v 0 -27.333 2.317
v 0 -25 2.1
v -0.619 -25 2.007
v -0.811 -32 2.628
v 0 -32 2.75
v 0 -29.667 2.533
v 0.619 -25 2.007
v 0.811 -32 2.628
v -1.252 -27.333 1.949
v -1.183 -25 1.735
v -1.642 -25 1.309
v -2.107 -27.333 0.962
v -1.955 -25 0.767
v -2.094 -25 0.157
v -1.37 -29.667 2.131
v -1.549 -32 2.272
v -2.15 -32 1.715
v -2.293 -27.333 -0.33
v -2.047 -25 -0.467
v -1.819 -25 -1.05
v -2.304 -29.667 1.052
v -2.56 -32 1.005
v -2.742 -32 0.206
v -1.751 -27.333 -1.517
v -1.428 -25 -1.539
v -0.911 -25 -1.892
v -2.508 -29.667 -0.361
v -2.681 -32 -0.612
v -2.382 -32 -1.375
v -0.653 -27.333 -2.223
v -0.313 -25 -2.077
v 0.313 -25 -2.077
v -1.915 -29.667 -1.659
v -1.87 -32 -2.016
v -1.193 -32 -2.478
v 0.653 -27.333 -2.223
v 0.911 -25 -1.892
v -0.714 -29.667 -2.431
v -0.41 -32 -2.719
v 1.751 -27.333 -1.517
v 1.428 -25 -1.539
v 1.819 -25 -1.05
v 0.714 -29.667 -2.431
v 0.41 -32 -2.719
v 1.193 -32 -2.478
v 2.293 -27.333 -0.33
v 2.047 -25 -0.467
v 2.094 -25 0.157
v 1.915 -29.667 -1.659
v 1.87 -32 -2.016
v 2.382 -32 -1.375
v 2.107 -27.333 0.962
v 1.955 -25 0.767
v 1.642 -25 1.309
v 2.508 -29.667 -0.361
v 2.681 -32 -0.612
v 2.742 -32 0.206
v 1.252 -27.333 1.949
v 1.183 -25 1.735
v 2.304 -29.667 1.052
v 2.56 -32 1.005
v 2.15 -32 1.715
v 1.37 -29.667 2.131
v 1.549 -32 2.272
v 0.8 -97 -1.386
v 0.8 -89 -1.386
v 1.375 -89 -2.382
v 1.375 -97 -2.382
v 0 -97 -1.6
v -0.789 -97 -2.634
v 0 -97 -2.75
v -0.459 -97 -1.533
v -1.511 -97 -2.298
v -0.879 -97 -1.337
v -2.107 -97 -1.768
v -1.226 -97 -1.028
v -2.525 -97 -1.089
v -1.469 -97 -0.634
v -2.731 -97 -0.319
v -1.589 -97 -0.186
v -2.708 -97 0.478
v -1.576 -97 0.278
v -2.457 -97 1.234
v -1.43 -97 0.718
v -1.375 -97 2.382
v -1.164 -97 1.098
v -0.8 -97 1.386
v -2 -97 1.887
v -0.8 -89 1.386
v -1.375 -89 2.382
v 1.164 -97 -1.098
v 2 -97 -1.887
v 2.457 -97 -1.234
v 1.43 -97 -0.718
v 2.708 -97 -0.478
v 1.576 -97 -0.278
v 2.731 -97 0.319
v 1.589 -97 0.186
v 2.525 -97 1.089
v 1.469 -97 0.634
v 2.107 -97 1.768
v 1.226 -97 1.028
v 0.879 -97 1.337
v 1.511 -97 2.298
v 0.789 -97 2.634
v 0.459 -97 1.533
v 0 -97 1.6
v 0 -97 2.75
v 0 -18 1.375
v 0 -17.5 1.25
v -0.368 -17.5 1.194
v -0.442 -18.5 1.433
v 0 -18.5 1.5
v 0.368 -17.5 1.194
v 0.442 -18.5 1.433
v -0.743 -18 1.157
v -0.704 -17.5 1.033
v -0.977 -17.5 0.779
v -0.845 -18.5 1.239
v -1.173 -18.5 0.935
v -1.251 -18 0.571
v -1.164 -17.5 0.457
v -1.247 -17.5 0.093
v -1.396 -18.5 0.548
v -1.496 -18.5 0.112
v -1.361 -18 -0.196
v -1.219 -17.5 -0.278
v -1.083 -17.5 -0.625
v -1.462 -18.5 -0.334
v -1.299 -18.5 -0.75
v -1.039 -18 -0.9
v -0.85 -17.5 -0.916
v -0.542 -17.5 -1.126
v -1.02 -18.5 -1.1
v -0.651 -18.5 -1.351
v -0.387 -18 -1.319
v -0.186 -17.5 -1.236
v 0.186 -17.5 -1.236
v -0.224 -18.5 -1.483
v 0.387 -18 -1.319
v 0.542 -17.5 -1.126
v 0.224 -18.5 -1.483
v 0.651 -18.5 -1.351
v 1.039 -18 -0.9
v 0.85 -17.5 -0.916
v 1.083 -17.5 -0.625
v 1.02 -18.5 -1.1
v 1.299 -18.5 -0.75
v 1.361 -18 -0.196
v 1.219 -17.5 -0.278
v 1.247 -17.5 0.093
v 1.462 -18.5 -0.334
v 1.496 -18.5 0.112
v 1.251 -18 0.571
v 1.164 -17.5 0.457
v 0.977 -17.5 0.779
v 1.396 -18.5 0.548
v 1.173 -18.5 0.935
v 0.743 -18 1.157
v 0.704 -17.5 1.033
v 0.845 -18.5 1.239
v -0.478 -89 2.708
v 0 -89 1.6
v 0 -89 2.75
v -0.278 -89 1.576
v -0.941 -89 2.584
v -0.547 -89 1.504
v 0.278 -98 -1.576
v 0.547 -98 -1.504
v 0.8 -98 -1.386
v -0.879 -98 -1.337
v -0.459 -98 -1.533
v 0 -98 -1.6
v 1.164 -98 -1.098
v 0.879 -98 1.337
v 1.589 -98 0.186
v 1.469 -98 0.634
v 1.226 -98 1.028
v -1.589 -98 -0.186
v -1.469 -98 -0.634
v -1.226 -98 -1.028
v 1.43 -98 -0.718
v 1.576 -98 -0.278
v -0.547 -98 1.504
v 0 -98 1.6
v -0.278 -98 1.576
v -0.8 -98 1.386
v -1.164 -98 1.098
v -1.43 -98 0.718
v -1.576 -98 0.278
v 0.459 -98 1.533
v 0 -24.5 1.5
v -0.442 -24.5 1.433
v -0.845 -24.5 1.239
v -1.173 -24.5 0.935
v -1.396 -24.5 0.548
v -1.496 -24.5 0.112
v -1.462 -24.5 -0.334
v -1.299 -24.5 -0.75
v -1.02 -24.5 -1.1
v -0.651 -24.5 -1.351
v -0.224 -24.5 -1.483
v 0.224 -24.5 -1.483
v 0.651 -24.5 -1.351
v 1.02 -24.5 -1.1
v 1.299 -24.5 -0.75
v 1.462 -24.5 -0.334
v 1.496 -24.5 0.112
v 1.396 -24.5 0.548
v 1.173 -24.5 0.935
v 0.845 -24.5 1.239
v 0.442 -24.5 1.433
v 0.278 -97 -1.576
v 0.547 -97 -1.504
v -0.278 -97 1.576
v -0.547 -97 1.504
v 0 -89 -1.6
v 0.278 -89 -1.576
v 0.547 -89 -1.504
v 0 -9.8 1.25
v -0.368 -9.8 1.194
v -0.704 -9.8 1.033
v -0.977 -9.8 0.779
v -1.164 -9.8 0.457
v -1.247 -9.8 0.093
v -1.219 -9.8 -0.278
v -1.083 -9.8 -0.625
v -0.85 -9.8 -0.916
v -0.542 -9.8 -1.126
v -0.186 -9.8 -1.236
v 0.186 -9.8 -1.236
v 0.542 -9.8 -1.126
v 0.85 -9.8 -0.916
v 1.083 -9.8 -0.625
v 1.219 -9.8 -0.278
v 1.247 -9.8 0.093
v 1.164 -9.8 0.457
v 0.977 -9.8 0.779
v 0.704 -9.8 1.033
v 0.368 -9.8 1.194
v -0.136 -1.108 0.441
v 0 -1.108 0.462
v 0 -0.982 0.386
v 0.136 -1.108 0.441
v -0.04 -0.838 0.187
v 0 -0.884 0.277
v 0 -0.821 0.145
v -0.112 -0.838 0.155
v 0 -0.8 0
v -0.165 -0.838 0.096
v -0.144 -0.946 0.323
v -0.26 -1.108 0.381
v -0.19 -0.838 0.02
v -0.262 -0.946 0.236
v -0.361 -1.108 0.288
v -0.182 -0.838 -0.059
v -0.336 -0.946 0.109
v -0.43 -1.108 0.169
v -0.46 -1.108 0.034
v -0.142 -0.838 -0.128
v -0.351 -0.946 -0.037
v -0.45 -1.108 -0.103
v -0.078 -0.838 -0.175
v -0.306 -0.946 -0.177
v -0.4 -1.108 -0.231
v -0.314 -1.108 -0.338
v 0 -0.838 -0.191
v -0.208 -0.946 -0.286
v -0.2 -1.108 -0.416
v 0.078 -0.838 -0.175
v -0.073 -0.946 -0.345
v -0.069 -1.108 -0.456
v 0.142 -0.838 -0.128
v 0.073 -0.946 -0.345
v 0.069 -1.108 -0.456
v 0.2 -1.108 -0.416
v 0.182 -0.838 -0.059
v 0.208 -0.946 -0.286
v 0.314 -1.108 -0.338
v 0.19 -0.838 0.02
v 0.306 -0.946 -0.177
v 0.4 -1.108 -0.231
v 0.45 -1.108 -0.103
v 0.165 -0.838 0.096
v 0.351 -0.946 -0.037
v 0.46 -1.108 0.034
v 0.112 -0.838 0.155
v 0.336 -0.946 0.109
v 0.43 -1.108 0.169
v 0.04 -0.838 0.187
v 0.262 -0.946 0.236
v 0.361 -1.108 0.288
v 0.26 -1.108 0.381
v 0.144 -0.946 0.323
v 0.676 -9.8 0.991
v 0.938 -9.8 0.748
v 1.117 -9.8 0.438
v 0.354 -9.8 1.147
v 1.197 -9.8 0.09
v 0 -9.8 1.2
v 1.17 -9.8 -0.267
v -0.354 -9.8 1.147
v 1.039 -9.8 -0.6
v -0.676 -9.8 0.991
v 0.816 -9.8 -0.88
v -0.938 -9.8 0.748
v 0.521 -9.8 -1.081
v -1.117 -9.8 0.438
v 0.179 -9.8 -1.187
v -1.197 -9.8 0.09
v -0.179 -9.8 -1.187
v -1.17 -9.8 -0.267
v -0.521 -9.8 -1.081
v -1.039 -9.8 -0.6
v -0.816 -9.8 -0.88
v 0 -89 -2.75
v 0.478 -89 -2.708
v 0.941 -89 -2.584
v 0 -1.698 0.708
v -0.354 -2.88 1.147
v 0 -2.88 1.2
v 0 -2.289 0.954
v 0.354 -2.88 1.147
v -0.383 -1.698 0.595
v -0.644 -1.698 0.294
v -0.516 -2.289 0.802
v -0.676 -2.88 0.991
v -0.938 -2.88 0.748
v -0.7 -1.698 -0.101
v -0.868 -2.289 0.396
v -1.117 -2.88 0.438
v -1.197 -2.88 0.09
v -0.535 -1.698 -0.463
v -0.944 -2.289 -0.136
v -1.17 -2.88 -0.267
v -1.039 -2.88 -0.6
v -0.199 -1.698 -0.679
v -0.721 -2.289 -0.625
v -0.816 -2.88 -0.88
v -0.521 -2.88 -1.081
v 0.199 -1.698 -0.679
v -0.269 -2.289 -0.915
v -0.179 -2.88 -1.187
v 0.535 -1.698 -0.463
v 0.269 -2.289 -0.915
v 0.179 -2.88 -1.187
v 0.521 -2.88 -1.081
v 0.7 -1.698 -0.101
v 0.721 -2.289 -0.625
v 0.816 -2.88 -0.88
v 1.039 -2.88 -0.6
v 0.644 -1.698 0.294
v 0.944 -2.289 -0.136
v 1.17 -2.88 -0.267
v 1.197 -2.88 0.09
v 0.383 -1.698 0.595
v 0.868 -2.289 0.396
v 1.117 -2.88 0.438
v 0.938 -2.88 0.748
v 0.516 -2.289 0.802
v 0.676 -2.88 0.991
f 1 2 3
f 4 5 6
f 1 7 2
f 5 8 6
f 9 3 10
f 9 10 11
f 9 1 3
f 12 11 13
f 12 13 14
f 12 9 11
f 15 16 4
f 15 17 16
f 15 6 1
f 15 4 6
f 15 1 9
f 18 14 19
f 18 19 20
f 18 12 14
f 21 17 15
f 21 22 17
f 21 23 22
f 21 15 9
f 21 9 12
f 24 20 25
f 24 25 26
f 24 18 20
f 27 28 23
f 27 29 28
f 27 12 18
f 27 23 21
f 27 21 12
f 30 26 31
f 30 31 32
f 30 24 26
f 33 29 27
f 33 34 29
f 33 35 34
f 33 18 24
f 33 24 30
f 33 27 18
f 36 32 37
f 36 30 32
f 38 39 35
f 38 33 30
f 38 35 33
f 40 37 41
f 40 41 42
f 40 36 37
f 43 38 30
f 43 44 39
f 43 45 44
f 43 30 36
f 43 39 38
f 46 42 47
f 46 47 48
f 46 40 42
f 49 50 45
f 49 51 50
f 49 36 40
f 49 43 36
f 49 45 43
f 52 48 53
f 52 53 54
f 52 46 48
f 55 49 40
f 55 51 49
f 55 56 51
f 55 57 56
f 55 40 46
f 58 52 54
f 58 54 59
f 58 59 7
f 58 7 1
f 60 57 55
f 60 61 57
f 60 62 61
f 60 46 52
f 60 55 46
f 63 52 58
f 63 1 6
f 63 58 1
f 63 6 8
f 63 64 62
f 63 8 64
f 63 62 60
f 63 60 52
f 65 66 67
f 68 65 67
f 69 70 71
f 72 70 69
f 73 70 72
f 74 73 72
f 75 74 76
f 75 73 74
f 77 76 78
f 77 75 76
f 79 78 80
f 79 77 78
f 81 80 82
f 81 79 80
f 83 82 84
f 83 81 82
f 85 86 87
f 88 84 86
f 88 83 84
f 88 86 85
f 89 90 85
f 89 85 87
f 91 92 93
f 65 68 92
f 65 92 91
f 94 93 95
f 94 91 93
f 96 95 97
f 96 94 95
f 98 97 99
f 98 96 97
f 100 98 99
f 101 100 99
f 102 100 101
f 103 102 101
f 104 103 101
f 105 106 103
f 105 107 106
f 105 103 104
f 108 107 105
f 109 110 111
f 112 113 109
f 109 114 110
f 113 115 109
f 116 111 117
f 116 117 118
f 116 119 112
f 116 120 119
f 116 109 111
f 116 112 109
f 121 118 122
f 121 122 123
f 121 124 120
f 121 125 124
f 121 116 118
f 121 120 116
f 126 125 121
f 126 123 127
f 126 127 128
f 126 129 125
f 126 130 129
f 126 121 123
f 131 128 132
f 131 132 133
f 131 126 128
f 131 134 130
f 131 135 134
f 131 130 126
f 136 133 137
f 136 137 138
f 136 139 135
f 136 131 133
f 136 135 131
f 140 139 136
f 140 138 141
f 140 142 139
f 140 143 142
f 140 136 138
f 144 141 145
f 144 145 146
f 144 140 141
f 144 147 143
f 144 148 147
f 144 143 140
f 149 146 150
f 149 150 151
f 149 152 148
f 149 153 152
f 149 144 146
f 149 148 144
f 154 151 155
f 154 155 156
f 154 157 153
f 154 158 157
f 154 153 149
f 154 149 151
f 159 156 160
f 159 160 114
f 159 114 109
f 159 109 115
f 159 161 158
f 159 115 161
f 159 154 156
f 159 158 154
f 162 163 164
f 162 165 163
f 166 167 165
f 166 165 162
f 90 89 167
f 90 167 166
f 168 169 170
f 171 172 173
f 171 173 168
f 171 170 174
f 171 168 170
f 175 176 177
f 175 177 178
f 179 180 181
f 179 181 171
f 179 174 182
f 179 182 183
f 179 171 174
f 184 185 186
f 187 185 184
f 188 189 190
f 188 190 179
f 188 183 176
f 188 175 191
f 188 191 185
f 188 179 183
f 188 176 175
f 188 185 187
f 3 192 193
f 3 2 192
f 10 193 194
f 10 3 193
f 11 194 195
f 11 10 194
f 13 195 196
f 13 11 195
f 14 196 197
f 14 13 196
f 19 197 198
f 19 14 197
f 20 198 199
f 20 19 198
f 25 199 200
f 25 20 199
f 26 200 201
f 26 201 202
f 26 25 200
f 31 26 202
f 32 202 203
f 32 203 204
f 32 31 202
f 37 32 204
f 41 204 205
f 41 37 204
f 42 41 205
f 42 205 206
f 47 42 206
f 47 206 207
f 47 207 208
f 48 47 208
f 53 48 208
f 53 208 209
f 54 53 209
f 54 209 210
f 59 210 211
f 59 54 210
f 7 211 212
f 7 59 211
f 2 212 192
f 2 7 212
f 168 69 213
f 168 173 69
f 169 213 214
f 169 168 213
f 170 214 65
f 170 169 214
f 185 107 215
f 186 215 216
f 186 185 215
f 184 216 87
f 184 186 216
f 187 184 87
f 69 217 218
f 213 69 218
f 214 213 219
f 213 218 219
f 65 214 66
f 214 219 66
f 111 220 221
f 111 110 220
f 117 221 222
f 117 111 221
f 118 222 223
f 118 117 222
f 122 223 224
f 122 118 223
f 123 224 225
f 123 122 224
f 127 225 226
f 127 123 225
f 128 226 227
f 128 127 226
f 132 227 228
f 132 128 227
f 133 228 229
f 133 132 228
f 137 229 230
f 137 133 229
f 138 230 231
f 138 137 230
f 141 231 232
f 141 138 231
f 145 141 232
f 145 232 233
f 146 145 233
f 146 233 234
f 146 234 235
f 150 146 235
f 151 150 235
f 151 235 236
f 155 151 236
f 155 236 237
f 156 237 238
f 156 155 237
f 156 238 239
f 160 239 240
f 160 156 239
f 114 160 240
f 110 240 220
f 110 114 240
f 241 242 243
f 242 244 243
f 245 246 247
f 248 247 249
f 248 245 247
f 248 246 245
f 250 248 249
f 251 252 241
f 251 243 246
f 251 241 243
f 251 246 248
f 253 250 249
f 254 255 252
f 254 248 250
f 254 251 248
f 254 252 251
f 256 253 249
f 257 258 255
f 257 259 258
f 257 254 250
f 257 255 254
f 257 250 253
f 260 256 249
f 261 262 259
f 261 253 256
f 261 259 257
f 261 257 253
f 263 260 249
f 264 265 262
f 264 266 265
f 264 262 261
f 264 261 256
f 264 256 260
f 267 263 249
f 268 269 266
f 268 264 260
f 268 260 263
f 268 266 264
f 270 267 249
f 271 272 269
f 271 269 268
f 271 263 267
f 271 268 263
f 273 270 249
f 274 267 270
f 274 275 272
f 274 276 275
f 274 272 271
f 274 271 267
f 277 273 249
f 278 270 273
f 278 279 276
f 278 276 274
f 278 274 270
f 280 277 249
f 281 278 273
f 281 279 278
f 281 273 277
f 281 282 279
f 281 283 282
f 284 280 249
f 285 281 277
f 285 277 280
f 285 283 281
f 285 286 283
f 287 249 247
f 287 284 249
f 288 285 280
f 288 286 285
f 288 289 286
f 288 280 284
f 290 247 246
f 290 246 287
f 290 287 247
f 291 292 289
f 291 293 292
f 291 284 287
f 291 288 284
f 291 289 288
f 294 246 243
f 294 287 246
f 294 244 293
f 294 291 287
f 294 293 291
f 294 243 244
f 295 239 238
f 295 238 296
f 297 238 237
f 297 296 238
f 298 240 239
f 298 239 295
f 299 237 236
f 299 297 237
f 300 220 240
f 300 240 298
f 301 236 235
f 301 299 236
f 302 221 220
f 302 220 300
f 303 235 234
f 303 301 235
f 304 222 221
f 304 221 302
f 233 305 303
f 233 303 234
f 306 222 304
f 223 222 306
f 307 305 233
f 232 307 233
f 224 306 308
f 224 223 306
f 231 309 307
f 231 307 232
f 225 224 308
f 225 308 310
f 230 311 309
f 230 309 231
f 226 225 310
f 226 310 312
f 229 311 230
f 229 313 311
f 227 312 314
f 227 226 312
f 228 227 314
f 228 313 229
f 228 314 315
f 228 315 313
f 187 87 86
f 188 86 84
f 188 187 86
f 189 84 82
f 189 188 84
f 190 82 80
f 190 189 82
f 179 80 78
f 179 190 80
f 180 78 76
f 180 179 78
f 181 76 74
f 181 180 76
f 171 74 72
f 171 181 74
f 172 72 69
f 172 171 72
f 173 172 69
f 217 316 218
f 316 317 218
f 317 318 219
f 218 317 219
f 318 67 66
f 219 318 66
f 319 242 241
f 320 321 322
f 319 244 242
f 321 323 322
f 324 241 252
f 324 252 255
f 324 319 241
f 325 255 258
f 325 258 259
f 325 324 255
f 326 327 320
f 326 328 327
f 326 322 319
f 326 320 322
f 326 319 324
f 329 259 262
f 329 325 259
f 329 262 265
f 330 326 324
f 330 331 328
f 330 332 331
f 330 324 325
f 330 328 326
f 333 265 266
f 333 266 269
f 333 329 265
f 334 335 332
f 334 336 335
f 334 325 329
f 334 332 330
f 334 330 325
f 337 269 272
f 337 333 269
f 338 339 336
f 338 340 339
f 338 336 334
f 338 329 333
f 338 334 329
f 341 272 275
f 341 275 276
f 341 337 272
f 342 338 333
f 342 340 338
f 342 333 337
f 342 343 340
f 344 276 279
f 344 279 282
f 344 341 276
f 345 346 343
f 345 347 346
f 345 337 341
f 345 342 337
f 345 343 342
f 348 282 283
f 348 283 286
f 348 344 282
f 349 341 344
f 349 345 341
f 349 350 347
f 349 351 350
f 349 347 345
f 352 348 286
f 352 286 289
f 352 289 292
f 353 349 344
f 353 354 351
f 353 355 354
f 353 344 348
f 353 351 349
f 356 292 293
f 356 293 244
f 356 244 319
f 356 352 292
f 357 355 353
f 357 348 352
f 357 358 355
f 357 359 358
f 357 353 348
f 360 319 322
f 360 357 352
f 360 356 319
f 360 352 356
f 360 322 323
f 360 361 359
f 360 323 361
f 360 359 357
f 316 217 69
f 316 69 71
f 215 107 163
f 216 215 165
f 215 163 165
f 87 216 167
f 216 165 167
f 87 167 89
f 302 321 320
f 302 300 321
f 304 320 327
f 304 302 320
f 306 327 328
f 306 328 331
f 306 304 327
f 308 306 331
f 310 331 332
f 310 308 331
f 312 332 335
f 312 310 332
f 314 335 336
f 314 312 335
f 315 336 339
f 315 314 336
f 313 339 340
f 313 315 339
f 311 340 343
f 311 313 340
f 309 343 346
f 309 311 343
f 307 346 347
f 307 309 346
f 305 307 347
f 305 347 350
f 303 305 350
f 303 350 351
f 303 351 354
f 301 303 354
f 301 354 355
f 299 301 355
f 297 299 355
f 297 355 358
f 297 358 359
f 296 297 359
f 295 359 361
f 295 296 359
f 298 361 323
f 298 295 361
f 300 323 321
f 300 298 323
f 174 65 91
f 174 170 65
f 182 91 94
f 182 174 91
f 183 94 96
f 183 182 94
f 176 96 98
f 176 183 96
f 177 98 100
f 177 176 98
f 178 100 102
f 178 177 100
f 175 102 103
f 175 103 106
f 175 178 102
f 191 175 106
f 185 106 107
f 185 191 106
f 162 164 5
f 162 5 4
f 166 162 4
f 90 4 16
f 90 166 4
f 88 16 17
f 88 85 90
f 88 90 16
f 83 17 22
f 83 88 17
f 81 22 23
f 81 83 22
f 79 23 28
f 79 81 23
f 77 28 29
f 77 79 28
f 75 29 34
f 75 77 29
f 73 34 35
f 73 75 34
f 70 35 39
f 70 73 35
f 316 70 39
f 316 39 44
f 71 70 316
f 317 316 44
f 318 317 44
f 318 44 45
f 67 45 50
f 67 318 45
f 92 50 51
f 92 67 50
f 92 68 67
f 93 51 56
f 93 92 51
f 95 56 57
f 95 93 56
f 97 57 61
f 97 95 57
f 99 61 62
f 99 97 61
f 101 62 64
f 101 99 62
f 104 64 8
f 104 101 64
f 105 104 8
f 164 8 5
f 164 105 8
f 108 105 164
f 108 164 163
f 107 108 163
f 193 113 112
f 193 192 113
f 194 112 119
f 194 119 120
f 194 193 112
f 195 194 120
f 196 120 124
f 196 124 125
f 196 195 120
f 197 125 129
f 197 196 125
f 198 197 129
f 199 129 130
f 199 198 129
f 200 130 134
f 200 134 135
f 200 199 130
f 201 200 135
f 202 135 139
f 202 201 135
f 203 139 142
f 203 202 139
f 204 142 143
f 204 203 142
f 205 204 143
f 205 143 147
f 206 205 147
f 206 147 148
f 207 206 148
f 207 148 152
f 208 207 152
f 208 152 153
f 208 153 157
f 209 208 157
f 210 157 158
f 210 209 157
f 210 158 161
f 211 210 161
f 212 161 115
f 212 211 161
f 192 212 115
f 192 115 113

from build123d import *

# Parameters (mm, degrees)
SKIZZE2_W               = 3
SKIZZE2_H               = 9
SCHNITT_ROTATION1_ANGLE = 30


with BuildPart() as part:
    # Skizze1 → Rotation1 (revolve)
    with BuildSketch(Plane.XY, mode=Mode.PRIVATE) as rotation1_sk:
        with BuildLine():
            Line((1.25, -17.5), (1.5, -18.5))
            Line((1.5, -18.5), (1.5, -24.5))
            Line((1.5, -24.5), (2.1, -25))
            Line((2.1, -25), (2.75, -32))
            Line((2.75, -32), (2.75, -97))
            Line((2.75, -97), (1.6, -97))
            Line((1.6, -97), (1.6, -98))
            Line((1.6, -98), (0, -98))
            Line((0, -98), (0, -0.8))
            ThreePointArc((0, -0.8), (0.277350098, -0.883974853), (0.461538462, -1.107692308))
            Line((0.461538462, -1.107692308), (1.2, -2.88))
            Line((1.2, -2.88), (1.2, -9.8))
            Line((1.2, -9.8), (1.25, -9.8))
            Line((1.25, -9.8), (1.25, -17.5))
        make_face()
    revolve(rotation1_sk.sketch.rotate(Axis((0, 4.010416667, 0), (0, -1, 0)), 90), axis=Axis((0, 4.010416667, 0), (0, -1, 0)))

    # Skizze2 → Schnitt-Rotation1 (revolve, cut)
    with BuildSketch(Plane(origin=(0, 0, 0), x_dir=(0, 0, -1), z_dir=(1, 0, 0))):
        with Locations((-3.1, -93.5)):
            Rectangle(SKIZZE2_W, SKIZZE2_H)
        with Locations((3.1, -93.5)):
            Rectangle(SKIZZE2_W, SKIZZE2_H)
    revolve(axis=Axis((0, -78.967863002, 0), (0, -1, 0)), revolution_arc=SCHNITT_ROTATION1_ANGLE, mode=Mode.SUBTRACT)


solid = part.part
